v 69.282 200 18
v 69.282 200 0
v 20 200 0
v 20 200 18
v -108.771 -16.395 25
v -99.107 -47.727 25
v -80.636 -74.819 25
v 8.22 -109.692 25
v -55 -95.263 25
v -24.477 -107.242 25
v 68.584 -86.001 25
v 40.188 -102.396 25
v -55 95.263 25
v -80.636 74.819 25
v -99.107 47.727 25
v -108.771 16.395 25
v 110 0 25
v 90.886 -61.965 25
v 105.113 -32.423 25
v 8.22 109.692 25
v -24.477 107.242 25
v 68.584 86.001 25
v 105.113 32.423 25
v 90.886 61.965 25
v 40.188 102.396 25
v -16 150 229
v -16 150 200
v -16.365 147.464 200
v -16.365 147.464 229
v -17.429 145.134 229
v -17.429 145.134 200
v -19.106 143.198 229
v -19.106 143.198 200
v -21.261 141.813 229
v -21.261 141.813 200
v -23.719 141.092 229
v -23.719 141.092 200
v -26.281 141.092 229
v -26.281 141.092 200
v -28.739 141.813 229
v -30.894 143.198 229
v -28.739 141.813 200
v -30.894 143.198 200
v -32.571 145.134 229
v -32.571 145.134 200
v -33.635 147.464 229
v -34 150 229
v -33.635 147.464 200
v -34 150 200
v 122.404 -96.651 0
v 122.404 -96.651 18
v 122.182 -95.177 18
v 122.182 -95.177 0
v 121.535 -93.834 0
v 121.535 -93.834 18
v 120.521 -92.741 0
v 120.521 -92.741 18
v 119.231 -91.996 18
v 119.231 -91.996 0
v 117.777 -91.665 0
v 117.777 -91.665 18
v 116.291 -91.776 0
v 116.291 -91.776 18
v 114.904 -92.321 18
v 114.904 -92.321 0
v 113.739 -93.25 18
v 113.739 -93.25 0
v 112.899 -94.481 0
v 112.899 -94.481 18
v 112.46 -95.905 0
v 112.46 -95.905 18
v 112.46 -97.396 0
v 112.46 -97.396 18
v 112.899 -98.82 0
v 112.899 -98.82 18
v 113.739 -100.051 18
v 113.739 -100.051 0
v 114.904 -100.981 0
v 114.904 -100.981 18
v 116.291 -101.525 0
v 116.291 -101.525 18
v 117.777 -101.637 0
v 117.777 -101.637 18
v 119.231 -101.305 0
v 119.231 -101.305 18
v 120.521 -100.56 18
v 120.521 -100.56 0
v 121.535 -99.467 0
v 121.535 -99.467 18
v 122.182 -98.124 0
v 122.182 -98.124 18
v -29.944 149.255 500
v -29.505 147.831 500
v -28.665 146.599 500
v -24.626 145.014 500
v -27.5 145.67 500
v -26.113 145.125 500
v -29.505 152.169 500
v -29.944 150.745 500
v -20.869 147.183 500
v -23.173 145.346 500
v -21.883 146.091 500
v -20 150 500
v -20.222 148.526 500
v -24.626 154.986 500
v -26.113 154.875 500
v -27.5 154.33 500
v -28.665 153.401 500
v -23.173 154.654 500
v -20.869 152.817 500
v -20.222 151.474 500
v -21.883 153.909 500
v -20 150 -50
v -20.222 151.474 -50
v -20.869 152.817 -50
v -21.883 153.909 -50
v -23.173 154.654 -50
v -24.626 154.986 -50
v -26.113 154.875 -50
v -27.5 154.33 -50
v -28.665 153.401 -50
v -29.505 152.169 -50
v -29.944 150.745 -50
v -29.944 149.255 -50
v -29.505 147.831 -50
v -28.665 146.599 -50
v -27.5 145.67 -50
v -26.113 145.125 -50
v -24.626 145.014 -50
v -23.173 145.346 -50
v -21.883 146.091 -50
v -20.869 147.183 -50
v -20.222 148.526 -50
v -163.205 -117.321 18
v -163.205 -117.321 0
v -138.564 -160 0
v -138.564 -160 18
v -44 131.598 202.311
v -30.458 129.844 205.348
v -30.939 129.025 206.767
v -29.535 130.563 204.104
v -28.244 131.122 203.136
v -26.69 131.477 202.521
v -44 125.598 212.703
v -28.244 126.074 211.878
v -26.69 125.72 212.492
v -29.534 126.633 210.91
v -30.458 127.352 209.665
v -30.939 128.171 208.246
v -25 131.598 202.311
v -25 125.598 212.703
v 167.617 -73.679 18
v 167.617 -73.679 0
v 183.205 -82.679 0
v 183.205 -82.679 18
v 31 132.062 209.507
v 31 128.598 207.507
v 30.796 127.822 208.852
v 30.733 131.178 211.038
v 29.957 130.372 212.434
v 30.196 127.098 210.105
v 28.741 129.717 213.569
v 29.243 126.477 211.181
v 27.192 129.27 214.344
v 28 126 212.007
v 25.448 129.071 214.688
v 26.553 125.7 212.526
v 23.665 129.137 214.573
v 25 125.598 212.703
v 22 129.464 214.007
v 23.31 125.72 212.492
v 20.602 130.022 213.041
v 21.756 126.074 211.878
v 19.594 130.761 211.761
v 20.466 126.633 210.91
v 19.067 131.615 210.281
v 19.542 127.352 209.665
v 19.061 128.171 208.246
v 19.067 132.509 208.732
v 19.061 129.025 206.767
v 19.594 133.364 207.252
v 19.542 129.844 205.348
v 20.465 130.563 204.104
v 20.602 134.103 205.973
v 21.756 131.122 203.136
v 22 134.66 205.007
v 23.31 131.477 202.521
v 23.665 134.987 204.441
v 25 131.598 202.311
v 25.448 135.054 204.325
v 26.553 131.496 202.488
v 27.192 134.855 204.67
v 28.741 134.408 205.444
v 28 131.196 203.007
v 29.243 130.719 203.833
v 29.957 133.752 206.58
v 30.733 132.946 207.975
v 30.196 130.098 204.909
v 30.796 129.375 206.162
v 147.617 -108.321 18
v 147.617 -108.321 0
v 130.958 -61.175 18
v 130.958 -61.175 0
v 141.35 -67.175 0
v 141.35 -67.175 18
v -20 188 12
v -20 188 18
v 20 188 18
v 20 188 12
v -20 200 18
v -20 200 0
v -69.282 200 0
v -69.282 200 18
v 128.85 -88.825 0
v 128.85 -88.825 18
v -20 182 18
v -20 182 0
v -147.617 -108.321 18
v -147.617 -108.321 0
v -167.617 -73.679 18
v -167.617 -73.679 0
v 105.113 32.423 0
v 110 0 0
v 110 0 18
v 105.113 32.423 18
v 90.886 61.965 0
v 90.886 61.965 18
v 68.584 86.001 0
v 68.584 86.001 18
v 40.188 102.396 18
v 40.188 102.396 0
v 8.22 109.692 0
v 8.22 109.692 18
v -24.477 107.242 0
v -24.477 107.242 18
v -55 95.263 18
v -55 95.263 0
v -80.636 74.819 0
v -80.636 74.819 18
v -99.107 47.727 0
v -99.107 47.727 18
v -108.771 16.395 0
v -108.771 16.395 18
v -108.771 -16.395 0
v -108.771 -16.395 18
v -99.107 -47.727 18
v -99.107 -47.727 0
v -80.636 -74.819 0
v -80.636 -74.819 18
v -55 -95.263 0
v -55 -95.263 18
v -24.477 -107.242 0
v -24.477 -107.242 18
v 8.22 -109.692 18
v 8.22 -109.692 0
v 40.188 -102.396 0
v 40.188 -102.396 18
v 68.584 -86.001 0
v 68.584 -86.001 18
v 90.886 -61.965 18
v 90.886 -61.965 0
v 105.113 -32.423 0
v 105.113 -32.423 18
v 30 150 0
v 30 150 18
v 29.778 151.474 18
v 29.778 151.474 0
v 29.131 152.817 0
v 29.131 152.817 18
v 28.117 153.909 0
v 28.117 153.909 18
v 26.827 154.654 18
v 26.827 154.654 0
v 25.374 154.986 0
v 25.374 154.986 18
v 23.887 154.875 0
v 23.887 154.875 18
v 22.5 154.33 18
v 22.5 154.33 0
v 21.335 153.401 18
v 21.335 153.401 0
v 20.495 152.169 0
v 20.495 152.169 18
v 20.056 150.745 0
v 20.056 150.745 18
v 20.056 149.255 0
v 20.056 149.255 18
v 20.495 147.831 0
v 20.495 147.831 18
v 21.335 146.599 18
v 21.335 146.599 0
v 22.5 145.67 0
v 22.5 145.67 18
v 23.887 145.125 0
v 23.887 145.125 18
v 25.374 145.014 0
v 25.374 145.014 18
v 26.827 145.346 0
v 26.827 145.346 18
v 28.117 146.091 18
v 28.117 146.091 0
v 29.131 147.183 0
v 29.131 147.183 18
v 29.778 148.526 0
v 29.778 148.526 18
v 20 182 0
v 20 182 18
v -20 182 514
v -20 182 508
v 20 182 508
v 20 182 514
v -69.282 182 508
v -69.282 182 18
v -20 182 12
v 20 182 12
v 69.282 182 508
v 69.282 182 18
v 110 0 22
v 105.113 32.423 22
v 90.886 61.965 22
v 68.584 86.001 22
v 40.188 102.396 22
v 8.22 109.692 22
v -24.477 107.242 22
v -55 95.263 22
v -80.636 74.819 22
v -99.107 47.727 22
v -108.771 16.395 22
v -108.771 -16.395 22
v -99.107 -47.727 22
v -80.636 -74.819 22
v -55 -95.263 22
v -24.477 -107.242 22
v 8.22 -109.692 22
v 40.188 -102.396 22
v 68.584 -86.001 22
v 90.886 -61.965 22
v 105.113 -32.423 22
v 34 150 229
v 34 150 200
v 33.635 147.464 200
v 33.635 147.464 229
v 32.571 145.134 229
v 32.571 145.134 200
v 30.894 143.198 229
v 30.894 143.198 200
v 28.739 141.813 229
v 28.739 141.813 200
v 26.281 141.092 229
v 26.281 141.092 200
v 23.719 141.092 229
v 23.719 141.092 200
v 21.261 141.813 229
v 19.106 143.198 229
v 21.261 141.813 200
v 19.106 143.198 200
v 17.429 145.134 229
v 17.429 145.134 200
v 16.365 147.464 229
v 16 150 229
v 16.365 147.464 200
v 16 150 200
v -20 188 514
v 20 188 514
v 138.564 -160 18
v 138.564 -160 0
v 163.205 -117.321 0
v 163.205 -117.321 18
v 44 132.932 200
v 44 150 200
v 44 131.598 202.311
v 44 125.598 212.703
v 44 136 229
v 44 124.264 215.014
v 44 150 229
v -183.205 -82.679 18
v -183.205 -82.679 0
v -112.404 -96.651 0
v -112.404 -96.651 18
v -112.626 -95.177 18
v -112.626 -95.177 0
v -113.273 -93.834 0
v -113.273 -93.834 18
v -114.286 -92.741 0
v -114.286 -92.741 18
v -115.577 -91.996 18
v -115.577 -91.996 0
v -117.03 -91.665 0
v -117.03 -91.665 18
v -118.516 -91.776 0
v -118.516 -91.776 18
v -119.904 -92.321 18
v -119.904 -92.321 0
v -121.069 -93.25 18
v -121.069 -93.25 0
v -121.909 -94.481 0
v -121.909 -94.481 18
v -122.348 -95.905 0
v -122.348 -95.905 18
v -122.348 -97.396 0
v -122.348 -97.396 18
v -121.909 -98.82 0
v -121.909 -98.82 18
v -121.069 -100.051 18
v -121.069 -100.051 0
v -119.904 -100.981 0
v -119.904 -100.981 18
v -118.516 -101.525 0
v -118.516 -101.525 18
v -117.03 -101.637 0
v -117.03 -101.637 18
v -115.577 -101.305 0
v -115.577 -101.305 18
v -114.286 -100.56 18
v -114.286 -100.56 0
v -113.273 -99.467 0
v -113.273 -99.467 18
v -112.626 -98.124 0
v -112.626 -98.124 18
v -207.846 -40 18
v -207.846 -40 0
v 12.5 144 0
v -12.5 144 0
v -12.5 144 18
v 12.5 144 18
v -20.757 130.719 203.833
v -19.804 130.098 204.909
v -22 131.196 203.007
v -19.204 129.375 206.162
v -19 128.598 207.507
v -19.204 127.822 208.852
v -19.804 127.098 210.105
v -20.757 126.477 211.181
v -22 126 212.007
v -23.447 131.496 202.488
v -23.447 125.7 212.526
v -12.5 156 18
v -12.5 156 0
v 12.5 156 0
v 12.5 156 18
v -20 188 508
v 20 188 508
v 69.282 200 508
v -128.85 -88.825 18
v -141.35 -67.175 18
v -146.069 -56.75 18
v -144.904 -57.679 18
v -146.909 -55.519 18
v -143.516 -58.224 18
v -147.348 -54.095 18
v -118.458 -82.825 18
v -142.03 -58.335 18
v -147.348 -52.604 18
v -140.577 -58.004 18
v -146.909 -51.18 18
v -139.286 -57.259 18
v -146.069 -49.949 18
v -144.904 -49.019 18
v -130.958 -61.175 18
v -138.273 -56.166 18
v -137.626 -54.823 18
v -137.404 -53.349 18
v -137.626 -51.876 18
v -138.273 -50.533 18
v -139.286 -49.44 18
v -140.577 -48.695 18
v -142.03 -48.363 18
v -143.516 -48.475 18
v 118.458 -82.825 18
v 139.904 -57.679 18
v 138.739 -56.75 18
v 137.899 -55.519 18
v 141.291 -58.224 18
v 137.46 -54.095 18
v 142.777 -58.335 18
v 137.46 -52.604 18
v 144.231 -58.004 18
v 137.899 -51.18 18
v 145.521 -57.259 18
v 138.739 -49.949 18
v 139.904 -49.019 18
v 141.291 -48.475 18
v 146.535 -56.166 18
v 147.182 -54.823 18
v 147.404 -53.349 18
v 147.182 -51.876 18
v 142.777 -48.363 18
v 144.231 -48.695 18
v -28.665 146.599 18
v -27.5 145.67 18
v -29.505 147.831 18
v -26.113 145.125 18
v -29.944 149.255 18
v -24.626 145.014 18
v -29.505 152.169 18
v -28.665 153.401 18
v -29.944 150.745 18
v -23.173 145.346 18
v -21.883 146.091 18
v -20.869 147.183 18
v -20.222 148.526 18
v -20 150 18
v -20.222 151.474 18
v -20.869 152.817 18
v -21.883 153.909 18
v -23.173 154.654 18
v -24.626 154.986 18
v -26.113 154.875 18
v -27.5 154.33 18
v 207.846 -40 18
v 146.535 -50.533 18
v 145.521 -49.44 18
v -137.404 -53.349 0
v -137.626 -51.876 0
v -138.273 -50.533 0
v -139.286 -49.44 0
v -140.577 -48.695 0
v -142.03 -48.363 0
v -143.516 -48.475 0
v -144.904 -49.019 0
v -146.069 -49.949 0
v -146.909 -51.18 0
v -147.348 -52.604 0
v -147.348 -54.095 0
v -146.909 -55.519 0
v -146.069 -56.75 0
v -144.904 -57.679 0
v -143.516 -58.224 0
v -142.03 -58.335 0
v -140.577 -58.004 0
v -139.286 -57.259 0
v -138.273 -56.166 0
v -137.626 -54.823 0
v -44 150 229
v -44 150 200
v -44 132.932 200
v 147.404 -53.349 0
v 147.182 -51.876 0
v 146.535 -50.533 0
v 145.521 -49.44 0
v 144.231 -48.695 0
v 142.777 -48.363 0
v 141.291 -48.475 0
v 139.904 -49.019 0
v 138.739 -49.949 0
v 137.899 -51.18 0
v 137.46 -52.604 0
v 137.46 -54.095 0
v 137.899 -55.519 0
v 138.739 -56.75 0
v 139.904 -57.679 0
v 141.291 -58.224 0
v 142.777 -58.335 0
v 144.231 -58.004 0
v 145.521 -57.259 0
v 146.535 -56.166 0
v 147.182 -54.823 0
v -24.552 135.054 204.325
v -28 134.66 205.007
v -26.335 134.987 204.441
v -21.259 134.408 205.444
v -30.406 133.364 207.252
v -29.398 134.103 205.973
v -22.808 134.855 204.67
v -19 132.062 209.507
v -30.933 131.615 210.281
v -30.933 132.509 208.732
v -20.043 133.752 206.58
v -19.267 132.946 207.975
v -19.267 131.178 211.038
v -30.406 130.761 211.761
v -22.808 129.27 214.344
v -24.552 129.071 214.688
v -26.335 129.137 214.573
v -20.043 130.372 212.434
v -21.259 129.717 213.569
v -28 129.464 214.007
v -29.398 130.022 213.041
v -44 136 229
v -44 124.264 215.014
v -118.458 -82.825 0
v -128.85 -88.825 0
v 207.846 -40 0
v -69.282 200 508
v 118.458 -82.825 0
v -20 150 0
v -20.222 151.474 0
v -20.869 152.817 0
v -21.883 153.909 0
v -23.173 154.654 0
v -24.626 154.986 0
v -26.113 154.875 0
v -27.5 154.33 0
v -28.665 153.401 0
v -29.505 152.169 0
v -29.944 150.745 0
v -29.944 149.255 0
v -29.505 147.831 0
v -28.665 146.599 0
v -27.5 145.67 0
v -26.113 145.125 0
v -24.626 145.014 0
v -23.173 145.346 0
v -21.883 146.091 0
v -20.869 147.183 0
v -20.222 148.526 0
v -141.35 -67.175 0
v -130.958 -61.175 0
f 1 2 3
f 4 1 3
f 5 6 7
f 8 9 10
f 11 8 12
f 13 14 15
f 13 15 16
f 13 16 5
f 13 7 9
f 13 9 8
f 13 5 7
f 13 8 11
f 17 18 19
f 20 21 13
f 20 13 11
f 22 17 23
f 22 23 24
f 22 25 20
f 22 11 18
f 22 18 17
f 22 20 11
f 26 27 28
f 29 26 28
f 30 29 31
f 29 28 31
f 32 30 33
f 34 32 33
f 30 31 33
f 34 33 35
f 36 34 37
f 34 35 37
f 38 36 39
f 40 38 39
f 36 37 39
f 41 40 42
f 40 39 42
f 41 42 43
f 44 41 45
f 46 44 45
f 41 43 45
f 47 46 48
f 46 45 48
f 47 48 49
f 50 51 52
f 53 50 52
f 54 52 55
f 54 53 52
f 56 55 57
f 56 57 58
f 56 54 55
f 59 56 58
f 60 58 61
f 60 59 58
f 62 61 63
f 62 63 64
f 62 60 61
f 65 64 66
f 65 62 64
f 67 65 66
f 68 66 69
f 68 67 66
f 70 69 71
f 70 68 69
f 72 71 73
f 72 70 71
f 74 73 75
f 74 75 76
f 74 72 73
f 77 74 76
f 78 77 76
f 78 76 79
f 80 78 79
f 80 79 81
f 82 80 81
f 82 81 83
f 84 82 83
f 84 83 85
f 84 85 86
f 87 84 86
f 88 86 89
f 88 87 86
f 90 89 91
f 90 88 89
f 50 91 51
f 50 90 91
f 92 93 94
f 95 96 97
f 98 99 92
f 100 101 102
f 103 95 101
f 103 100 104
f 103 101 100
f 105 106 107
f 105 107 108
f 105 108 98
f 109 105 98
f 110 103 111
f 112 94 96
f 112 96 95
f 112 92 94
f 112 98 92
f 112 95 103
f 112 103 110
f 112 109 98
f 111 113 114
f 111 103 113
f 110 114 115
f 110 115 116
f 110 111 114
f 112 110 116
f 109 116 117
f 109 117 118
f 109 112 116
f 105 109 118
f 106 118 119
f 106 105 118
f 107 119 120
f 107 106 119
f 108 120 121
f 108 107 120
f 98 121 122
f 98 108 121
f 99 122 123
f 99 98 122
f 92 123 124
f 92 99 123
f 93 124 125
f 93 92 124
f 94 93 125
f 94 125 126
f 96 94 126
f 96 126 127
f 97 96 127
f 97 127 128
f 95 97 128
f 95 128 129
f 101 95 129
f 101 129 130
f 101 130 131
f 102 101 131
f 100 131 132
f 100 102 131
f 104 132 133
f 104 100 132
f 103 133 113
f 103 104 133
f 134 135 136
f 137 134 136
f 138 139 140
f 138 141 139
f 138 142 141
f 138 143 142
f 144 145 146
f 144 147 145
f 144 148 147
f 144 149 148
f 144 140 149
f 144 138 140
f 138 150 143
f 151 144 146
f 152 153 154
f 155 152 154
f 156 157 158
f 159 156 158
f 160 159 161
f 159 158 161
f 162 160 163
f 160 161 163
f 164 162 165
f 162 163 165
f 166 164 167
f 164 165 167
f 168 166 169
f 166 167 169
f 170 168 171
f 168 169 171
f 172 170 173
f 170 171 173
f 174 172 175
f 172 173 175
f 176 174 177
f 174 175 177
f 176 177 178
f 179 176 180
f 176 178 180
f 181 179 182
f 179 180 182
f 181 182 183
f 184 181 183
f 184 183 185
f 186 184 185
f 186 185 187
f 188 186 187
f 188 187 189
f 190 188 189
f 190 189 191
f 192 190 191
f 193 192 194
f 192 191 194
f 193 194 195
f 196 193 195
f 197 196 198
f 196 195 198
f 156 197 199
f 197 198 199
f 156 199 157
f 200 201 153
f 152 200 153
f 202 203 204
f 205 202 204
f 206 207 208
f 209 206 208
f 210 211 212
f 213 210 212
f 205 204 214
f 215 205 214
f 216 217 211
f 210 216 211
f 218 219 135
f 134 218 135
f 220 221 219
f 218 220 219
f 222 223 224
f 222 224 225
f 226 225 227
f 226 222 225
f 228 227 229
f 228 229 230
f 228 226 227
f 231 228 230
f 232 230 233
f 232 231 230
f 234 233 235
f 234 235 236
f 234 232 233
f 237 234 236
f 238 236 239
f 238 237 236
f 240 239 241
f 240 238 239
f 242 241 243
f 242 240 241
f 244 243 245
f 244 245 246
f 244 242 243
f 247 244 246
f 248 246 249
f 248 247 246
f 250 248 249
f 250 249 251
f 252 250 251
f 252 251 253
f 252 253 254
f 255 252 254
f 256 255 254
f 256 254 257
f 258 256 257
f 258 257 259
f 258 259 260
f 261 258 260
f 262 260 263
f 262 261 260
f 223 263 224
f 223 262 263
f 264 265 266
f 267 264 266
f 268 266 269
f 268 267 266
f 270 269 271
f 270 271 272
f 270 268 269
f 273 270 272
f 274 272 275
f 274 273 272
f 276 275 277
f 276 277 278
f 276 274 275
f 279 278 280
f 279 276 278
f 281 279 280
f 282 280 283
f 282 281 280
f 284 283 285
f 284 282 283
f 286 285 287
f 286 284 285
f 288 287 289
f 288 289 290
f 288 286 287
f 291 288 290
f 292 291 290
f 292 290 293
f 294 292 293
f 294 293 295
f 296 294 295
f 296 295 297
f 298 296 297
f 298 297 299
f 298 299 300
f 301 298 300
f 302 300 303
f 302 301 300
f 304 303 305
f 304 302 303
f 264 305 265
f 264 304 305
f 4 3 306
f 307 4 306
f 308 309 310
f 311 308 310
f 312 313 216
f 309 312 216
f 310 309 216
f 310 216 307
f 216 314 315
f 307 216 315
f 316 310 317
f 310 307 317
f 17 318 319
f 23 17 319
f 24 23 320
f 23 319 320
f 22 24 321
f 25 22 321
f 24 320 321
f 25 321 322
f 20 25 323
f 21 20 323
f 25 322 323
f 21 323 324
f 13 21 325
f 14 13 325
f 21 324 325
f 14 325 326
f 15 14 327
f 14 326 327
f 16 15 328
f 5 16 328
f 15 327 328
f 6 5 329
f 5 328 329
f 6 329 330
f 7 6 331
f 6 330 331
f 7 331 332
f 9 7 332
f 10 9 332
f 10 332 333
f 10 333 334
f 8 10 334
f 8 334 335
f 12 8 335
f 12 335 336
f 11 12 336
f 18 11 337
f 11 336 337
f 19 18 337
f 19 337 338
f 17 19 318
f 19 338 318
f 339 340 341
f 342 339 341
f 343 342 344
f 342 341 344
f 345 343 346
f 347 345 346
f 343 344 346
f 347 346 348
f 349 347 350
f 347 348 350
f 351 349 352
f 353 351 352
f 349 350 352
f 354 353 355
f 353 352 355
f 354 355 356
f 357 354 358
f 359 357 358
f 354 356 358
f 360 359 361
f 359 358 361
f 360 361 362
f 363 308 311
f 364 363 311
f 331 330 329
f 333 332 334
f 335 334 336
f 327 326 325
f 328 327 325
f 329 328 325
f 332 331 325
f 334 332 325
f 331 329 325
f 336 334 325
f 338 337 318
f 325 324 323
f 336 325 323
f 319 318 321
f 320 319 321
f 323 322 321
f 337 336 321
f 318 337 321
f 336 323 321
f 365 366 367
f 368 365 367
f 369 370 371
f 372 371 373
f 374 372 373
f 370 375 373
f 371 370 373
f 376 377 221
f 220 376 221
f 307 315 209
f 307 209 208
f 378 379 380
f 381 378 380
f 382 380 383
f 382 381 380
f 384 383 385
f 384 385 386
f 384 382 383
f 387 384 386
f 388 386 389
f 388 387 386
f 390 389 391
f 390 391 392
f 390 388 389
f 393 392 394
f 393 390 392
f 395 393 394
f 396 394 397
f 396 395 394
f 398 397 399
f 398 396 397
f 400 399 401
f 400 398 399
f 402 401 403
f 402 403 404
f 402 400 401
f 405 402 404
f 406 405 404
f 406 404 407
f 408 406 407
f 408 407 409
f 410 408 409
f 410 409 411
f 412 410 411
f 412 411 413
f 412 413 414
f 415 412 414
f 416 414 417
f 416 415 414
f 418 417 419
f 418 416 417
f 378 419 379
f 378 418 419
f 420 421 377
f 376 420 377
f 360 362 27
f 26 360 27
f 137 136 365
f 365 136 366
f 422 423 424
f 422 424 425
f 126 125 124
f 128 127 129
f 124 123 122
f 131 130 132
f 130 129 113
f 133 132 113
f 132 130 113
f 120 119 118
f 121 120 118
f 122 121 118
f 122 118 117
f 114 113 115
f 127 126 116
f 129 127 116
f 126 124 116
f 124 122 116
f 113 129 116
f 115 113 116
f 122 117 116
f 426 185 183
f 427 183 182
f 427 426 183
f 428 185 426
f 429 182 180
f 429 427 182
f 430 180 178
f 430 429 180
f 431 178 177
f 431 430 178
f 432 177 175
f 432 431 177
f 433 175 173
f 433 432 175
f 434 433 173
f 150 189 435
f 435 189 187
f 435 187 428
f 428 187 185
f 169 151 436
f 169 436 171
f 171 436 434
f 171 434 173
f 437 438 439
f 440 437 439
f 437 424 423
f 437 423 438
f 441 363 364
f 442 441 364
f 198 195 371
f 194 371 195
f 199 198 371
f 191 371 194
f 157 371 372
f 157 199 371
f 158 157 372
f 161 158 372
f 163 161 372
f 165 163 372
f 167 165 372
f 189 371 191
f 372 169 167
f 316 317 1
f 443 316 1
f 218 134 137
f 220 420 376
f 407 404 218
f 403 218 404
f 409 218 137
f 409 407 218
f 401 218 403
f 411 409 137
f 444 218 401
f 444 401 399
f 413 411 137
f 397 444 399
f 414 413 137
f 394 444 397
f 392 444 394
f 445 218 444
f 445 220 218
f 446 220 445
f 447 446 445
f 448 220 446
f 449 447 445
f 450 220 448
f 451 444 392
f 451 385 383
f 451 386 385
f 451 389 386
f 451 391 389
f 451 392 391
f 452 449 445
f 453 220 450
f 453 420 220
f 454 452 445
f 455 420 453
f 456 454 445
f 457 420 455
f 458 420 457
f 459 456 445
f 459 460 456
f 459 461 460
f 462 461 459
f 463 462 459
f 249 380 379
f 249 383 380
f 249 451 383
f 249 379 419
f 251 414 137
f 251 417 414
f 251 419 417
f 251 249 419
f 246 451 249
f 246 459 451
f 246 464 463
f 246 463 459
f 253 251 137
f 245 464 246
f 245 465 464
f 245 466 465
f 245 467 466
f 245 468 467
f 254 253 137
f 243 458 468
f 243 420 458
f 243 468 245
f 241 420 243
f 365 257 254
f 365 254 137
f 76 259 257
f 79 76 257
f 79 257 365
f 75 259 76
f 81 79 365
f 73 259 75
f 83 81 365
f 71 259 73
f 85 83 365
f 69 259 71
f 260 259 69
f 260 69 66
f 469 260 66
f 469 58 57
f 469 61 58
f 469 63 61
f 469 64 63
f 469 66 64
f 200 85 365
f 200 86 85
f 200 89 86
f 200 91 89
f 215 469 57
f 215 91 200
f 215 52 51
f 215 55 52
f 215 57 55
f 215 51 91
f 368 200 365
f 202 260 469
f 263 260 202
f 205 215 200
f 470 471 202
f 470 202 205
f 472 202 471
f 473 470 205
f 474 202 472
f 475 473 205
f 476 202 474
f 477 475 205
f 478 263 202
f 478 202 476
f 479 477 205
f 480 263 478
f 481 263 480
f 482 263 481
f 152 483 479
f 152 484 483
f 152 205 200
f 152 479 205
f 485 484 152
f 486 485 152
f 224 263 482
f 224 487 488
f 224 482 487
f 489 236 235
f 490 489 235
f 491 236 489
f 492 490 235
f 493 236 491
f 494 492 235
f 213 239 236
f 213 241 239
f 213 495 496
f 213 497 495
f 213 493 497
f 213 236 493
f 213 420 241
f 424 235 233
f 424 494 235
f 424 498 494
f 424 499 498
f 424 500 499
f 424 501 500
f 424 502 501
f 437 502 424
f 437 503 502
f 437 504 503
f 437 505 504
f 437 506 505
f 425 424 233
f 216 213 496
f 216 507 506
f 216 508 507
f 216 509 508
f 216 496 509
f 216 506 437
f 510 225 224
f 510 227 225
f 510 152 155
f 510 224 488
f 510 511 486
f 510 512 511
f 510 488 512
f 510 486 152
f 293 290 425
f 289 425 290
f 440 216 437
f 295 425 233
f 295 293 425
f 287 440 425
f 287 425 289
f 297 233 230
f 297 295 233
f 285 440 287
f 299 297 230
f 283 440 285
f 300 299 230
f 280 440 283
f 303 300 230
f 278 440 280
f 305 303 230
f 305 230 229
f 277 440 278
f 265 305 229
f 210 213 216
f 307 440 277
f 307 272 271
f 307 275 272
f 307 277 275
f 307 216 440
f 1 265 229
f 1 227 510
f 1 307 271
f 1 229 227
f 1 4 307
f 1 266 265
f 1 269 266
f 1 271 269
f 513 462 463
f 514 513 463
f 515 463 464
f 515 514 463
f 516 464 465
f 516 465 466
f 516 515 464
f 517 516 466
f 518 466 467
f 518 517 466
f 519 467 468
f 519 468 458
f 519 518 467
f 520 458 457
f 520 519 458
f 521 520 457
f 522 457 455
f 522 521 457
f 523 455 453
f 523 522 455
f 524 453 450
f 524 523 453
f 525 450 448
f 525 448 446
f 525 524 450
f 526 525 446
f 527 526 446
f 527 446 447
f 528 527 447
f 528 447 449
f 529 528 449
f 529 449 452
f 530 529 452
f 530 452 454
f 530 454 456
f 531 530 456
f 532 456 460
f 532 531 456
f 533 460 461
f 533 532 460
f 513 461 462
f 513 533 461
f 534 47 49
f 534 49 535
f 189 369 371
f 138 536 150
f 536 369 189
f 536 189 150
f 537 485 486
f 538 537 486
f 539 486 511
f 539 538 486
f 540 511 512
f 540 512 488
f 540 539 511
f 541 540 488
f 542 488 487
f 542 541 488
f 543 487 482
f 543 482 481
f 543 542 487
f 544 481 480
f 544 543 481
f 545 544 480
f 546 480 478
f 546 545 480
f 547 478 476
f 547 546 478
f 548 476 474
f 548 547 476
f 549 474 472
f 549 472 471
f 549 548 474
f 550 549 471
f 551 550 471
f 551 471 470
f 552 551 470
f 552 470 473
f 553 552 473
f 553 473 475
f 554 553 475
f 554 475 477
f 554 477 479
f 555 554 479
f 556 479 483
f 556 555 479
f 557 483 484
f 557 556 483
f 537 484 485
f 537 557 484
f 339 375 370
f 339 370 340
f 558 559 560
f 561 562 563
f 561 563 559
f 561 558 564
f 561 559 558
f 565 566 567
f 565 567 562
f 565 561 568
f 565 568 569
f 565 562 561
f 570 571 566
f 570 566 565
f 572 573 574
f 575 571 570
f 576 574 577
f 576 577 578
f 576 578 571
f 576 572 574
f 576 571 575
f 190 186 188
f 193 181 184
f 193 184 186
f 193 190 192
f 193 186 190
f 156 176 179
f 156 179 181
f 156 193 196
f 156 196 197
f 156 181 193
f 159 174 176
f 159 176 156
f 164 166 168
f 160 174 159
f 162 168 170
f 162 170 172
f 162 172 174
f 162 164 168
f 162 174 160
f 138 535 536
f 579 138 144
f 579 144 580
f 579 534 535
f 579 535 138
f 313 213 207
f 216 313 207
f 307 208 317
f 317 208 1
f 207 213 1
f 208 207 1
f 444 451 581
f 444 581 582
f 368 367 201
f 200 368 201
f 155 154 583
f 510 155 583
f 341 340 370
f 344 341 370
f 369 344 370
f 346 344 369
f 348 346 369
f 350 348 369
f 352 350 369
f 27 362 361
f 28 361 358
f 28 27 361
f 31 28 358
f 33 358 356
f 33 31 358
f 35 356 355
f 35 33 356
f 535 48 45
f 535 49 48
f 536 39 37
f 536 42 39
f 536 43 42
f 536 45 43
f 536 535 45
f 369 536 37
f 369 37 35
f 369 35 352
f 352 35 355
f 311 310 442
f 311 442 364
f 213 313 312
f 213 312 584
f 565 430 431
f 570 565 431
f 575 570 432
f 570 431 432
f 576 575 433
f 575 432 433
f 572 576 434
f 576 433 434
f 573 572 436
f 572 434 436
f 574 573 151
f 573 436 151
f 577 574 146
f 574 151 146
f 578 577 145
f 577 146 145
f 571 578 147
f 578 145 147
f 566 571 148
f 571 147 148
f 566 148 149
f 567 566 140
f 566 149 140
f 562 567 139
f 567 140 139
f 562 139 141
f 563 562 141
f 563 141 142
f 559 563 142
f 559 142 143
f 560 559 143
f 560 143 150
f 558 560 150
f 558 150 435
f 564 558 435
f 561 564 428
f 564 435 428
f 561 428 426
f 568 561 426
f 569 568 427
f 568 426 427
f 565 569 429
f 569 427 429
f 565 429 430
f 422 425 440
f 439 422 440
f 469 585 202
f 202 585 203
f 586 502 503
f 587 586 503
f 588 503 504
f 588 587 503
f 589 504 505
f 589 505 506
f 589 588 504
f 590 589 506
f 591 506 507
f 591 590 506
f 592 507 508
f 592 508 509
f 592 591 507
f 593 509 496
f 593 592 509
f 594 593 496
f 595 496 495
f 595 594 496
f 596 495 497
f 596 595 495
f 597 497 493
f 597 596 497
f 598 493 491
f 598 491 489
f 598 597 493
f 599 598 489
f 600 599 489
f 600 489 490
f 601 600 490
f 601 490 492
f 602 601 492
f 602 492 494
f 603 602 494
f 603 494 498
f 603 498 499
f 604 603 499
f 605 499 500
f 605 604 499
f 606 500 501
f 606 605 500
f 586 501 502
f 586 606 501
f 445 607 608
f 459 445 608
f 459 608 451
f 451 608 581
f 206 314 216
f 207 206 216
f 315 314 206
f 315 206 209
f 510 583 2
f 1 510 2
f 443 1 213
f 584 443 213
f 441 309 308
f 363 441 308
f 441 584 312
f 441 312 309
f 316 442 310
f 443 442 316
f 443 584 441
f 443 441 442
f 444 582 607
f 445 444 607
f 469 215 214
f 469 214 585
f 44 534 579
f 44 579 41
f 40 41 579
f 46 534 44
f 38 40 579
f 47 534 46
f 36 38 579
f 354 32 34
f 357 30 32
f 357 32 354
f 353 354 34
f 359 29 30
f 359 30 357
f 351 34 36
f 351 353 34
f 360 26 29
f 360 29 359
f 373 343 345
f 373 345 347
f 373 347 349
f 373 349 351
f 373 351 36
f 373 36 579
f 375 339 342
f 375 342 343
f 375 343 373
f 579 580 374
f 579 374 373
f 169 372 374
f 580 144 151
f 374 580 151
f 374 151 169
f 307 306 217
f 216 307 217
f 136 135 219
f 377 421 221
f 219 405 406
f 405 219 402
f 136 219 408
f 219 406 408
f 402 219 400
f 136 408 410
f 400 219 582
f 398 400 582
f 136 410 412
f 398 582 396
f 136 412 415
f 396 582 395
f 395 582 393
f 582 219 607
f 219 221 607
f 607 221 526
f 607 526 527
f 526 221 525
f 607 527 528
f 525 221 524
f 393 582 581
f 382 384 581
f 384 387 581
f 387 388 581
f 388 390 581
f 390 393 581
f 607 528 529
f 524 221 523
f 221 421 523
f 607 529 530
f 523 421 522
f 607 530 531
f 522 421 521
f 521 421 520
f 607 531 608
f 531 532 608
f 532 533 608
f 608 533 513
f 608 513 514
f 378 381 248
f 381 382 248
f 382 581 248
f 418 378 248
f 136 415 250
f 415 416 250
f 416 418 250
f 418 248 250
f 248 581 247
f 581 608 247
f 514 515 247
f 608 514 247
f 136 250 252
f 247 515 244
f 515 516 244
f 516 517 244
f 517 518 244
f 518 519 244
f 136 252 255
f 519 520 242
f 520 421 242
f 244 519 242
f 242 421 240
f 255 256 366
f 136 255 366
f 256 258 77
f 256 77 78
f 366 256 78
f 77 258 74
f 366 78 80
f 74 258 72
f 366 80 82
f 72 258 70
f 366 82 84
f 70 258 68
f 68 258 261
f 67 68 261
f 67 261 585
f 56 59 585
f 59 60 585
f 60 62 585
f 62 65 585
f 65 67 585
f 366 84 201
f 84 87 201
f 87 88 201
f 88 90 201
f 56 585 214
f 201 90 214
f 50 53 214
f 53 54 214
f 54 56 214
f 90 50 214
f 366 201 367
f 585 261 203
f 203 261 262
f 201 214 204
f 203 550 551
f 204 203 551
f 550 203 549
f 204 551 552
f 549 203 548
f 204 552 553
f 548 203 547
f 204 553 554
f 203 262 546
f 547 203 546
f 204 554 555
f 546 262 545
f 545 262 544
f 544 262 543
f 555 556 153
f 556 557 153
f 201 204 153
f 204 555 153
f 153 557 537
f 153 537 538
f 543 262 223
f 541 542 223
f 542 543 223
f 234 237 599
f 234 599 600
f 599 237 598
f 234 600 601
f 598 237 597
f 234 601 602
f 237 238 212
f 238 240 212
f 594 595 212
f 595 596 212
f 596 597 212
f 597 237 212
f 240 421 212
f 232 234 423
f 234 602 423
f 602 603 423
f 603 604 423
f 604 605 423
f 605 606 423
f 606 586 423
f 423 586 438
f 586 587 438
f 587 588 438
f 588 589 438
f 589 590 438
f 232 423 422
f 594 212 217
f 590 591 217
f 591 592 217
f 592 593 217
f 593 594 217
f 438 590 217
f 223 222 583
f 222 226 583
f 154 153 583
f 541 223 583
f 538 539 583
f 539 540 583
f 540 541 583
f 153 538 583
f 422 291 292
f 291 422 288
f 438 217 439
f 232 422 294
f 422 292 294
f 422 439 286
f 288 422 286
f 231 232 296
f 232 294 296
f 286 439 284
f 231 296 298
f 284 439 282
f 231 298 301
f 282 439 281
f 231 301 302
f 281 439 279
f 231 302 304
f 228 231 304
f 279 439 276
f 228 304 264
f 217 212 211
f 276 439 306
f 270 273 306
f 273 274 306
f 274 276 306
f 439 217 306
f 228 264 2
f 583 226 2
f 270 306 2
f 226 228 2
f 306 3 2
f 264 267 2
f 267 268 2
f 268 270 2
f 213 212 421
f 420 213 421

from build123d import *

# Parameters (mm, degrees)
F0_R          = 5
F0_R_2        = 110
F0_W          = 25
F0_H          = 12
F1_DEPTH      = 18
F2_DEPTH      = 500
F2_DEPTH_BACK = 50
F3_START      = 22
F3_DEPTH      = 3
F4_W          = 49.2820323028
F4_H          = 18
F4_W_2        = 40
F5_DEPTH      = 490
F6_W          = 40
F6_H          = 6
F7_DEPTH      = 6
F10_DEPTH     = 29
F12_DEPTH     = 88
F13_R         = 6
F14_DEPTH     = 4


with BuildPart() as f1:
    # F0 (on Top) → F1 (new body)
    with BuildSketch(Plane.XY):
        Polygon((-20, 200), (-69.2820323028, 200), (-207.8460969083, -40), (-183.2050807569, -82.6794919243), (-167.6166234888, -73.6794919243), (-147.6166234888, -108.3205080757), (-163.2050807569, -117.3205080757), (-138.5640646055, -160), (138.5640646055, -160), (163.2050807569, -117.3205080757), (147.6166234888, -108.3205080757), (167.6166234888, -73.6794919243), (183.2050807569, -82.6794919243), (207.8460969083, -40), (69.2820323028, 200), (20, 200), (20, 182), (-20, 182), align=None)
        with Locations((-117.4038105677, -96.6506350946)):
            Circle(F0_R, mode=Mode.SUBTRACT)
        Polygon((-141.3499629904, -67.1746824527), (-130.957658145, -61.1746824527), (-118.457658145, -82.8253175473), (-128.8499629904, -88.8253175473), align=None, mode=Mode.SUBTRACT)
        with Locations((-142.4038105677, -53.3493649054)):
            Circle(F0_R, mode=Mode.SUBTRACT)
        Circle(F0_R_2, mode=Mode.SUBTRACT)
        with Locations((117.4038105677, -96.6506350946)):
            Circle(F0_R, mode=Mode.SUBTRACT)
        Polygon((128.8499629904, -88.8253175473), (118.457658145, -82.8253175473), (130.957658145, -61.1746824527), (141.3499629904, -67.1746824527), align=None, mode=Mode.SUBTRACT)
        with Locations((142.4038105677, -53.3493649054)):
            Circle(F0_R, mode=Mode.SUBTRACT)
        with Locations((-25, 150)):
            Circle(F0_R, mode=Mode.SUBTRACT)
        with Locations((0, 150)):
            Rectangle(F0_W, F0_H, mode=Mode.SUBTRACT)
        with Locations((25, 150)):
            Circle(F0_R, mode=Mode.SUBTRACT)
    extrude(amount=F1_DEPTH)


with BuildPart() as f2:
    # F0 (on Top) → F2 (new body, two sides)
    with BuildSketch(Plane.XY) as f2_sk:
        with Locations((-25, 150)):
            Circle(F0_R)
    extrude(amount=F2_DEPTH)
    extrude(f2_sk.sketch, amount=-F2_DEPTH_BACK)


with BuildPart() as f3:
    # F0 (on Top) → F3 (new body)
    with BuildSketch(Plane.XY.offset(F3_START)):
        Circle(F0_R_2)
    extrude(amount=F3_DEPTH)


with BuildPart() as f5:
    # F4 (on face) → F5 (new body)
    with BuildSketch(Plane.XY.offset(18)):
        with Locations((-44.6410161514, 191)):
            Rectangle(F4_W, F4_H)
        with Locations((0, 191)):
            Rectangle(F4_W_2, F4_H)
        with Locations((44.6410161514, 191)):
            Rectangle(F4_W, F4_H)
    extrude(amount=F5_DEPTH)

    # F6 (on face) → F7 (join)
    with BuildSketch(Plane.XZ.offset(-182)):
        with Locations((0, 15)):
            Rectangle(F6_W, F6_H)
        with Locations((0, 511)):
            Rectangle(F6_W, F6_H)
    extrude(amount=-F7_DEPTH)


with BuildPart() as f10:
    # F9 (on offset) → F10 (new body)
    with BuildSketch(Plane.XY.offset(200)):
        with BuildLine():
            ThreePointArc((-16, 150), (-25, 141), (-34, 150))
            Line((-34, 150), (-44, 150))
            Line((-44, 150), (-44, 136))
            Line((-44, 136), (44, 136))
            Line((44, 136), (44, 150))
            Line((44, 150), (34, 150))
            ThreePointArc((34, 150), (25, 141), (16, 150))
            Line((16, 150), (-16, 150))
        make_face()
    extrude(amount=F10_DEPTH)

    # F11 (on face) → F12 (join)
    with BuildSketch(Plane(origin=(-44, 0, 0), x_dir=(0, -1, 0), z_dir=(-1, 0, 0))):
        Polygon((-131.5980762114, 202.3106503669), (-135.0621778265, 204.3106503669), (-129.0621778265, 214.7029552123), (-125.5980762114, 212.7029552123), (-124.2640216, 215.0136055792), (-136, 229), (-136, 200), (-132.9321308227, 200), align=None)
        Polygon((-129.0621778265, 214.7029552123), (-135.0621778265, 204.3106503669), (-131.5980762114, 202.3106503669), (-125.5980762114, 212.7029552123), align=None)
    extrude(amount=-F12_DEPTH)

    # F13 (on face) → F14 (cut)
    with BuildSketch(Plane(origin=(0, 186.3016384955, 107.5613011358), x_dir=(1, 0, 0), z_dir=(0, -0.8660254038, -0.5))):
        with Locations((-25, 115.4071245682)):
            Circle(F13_R)
        with Locations((25, 115.4071245682)):
            Circle(F13_R)
    extrude(amount=-F14_DEPTH, mode=Mode.SUBTRACT)


solid = Compound([f1.part, f2.part, f3.part, f5.part, f10.part])
